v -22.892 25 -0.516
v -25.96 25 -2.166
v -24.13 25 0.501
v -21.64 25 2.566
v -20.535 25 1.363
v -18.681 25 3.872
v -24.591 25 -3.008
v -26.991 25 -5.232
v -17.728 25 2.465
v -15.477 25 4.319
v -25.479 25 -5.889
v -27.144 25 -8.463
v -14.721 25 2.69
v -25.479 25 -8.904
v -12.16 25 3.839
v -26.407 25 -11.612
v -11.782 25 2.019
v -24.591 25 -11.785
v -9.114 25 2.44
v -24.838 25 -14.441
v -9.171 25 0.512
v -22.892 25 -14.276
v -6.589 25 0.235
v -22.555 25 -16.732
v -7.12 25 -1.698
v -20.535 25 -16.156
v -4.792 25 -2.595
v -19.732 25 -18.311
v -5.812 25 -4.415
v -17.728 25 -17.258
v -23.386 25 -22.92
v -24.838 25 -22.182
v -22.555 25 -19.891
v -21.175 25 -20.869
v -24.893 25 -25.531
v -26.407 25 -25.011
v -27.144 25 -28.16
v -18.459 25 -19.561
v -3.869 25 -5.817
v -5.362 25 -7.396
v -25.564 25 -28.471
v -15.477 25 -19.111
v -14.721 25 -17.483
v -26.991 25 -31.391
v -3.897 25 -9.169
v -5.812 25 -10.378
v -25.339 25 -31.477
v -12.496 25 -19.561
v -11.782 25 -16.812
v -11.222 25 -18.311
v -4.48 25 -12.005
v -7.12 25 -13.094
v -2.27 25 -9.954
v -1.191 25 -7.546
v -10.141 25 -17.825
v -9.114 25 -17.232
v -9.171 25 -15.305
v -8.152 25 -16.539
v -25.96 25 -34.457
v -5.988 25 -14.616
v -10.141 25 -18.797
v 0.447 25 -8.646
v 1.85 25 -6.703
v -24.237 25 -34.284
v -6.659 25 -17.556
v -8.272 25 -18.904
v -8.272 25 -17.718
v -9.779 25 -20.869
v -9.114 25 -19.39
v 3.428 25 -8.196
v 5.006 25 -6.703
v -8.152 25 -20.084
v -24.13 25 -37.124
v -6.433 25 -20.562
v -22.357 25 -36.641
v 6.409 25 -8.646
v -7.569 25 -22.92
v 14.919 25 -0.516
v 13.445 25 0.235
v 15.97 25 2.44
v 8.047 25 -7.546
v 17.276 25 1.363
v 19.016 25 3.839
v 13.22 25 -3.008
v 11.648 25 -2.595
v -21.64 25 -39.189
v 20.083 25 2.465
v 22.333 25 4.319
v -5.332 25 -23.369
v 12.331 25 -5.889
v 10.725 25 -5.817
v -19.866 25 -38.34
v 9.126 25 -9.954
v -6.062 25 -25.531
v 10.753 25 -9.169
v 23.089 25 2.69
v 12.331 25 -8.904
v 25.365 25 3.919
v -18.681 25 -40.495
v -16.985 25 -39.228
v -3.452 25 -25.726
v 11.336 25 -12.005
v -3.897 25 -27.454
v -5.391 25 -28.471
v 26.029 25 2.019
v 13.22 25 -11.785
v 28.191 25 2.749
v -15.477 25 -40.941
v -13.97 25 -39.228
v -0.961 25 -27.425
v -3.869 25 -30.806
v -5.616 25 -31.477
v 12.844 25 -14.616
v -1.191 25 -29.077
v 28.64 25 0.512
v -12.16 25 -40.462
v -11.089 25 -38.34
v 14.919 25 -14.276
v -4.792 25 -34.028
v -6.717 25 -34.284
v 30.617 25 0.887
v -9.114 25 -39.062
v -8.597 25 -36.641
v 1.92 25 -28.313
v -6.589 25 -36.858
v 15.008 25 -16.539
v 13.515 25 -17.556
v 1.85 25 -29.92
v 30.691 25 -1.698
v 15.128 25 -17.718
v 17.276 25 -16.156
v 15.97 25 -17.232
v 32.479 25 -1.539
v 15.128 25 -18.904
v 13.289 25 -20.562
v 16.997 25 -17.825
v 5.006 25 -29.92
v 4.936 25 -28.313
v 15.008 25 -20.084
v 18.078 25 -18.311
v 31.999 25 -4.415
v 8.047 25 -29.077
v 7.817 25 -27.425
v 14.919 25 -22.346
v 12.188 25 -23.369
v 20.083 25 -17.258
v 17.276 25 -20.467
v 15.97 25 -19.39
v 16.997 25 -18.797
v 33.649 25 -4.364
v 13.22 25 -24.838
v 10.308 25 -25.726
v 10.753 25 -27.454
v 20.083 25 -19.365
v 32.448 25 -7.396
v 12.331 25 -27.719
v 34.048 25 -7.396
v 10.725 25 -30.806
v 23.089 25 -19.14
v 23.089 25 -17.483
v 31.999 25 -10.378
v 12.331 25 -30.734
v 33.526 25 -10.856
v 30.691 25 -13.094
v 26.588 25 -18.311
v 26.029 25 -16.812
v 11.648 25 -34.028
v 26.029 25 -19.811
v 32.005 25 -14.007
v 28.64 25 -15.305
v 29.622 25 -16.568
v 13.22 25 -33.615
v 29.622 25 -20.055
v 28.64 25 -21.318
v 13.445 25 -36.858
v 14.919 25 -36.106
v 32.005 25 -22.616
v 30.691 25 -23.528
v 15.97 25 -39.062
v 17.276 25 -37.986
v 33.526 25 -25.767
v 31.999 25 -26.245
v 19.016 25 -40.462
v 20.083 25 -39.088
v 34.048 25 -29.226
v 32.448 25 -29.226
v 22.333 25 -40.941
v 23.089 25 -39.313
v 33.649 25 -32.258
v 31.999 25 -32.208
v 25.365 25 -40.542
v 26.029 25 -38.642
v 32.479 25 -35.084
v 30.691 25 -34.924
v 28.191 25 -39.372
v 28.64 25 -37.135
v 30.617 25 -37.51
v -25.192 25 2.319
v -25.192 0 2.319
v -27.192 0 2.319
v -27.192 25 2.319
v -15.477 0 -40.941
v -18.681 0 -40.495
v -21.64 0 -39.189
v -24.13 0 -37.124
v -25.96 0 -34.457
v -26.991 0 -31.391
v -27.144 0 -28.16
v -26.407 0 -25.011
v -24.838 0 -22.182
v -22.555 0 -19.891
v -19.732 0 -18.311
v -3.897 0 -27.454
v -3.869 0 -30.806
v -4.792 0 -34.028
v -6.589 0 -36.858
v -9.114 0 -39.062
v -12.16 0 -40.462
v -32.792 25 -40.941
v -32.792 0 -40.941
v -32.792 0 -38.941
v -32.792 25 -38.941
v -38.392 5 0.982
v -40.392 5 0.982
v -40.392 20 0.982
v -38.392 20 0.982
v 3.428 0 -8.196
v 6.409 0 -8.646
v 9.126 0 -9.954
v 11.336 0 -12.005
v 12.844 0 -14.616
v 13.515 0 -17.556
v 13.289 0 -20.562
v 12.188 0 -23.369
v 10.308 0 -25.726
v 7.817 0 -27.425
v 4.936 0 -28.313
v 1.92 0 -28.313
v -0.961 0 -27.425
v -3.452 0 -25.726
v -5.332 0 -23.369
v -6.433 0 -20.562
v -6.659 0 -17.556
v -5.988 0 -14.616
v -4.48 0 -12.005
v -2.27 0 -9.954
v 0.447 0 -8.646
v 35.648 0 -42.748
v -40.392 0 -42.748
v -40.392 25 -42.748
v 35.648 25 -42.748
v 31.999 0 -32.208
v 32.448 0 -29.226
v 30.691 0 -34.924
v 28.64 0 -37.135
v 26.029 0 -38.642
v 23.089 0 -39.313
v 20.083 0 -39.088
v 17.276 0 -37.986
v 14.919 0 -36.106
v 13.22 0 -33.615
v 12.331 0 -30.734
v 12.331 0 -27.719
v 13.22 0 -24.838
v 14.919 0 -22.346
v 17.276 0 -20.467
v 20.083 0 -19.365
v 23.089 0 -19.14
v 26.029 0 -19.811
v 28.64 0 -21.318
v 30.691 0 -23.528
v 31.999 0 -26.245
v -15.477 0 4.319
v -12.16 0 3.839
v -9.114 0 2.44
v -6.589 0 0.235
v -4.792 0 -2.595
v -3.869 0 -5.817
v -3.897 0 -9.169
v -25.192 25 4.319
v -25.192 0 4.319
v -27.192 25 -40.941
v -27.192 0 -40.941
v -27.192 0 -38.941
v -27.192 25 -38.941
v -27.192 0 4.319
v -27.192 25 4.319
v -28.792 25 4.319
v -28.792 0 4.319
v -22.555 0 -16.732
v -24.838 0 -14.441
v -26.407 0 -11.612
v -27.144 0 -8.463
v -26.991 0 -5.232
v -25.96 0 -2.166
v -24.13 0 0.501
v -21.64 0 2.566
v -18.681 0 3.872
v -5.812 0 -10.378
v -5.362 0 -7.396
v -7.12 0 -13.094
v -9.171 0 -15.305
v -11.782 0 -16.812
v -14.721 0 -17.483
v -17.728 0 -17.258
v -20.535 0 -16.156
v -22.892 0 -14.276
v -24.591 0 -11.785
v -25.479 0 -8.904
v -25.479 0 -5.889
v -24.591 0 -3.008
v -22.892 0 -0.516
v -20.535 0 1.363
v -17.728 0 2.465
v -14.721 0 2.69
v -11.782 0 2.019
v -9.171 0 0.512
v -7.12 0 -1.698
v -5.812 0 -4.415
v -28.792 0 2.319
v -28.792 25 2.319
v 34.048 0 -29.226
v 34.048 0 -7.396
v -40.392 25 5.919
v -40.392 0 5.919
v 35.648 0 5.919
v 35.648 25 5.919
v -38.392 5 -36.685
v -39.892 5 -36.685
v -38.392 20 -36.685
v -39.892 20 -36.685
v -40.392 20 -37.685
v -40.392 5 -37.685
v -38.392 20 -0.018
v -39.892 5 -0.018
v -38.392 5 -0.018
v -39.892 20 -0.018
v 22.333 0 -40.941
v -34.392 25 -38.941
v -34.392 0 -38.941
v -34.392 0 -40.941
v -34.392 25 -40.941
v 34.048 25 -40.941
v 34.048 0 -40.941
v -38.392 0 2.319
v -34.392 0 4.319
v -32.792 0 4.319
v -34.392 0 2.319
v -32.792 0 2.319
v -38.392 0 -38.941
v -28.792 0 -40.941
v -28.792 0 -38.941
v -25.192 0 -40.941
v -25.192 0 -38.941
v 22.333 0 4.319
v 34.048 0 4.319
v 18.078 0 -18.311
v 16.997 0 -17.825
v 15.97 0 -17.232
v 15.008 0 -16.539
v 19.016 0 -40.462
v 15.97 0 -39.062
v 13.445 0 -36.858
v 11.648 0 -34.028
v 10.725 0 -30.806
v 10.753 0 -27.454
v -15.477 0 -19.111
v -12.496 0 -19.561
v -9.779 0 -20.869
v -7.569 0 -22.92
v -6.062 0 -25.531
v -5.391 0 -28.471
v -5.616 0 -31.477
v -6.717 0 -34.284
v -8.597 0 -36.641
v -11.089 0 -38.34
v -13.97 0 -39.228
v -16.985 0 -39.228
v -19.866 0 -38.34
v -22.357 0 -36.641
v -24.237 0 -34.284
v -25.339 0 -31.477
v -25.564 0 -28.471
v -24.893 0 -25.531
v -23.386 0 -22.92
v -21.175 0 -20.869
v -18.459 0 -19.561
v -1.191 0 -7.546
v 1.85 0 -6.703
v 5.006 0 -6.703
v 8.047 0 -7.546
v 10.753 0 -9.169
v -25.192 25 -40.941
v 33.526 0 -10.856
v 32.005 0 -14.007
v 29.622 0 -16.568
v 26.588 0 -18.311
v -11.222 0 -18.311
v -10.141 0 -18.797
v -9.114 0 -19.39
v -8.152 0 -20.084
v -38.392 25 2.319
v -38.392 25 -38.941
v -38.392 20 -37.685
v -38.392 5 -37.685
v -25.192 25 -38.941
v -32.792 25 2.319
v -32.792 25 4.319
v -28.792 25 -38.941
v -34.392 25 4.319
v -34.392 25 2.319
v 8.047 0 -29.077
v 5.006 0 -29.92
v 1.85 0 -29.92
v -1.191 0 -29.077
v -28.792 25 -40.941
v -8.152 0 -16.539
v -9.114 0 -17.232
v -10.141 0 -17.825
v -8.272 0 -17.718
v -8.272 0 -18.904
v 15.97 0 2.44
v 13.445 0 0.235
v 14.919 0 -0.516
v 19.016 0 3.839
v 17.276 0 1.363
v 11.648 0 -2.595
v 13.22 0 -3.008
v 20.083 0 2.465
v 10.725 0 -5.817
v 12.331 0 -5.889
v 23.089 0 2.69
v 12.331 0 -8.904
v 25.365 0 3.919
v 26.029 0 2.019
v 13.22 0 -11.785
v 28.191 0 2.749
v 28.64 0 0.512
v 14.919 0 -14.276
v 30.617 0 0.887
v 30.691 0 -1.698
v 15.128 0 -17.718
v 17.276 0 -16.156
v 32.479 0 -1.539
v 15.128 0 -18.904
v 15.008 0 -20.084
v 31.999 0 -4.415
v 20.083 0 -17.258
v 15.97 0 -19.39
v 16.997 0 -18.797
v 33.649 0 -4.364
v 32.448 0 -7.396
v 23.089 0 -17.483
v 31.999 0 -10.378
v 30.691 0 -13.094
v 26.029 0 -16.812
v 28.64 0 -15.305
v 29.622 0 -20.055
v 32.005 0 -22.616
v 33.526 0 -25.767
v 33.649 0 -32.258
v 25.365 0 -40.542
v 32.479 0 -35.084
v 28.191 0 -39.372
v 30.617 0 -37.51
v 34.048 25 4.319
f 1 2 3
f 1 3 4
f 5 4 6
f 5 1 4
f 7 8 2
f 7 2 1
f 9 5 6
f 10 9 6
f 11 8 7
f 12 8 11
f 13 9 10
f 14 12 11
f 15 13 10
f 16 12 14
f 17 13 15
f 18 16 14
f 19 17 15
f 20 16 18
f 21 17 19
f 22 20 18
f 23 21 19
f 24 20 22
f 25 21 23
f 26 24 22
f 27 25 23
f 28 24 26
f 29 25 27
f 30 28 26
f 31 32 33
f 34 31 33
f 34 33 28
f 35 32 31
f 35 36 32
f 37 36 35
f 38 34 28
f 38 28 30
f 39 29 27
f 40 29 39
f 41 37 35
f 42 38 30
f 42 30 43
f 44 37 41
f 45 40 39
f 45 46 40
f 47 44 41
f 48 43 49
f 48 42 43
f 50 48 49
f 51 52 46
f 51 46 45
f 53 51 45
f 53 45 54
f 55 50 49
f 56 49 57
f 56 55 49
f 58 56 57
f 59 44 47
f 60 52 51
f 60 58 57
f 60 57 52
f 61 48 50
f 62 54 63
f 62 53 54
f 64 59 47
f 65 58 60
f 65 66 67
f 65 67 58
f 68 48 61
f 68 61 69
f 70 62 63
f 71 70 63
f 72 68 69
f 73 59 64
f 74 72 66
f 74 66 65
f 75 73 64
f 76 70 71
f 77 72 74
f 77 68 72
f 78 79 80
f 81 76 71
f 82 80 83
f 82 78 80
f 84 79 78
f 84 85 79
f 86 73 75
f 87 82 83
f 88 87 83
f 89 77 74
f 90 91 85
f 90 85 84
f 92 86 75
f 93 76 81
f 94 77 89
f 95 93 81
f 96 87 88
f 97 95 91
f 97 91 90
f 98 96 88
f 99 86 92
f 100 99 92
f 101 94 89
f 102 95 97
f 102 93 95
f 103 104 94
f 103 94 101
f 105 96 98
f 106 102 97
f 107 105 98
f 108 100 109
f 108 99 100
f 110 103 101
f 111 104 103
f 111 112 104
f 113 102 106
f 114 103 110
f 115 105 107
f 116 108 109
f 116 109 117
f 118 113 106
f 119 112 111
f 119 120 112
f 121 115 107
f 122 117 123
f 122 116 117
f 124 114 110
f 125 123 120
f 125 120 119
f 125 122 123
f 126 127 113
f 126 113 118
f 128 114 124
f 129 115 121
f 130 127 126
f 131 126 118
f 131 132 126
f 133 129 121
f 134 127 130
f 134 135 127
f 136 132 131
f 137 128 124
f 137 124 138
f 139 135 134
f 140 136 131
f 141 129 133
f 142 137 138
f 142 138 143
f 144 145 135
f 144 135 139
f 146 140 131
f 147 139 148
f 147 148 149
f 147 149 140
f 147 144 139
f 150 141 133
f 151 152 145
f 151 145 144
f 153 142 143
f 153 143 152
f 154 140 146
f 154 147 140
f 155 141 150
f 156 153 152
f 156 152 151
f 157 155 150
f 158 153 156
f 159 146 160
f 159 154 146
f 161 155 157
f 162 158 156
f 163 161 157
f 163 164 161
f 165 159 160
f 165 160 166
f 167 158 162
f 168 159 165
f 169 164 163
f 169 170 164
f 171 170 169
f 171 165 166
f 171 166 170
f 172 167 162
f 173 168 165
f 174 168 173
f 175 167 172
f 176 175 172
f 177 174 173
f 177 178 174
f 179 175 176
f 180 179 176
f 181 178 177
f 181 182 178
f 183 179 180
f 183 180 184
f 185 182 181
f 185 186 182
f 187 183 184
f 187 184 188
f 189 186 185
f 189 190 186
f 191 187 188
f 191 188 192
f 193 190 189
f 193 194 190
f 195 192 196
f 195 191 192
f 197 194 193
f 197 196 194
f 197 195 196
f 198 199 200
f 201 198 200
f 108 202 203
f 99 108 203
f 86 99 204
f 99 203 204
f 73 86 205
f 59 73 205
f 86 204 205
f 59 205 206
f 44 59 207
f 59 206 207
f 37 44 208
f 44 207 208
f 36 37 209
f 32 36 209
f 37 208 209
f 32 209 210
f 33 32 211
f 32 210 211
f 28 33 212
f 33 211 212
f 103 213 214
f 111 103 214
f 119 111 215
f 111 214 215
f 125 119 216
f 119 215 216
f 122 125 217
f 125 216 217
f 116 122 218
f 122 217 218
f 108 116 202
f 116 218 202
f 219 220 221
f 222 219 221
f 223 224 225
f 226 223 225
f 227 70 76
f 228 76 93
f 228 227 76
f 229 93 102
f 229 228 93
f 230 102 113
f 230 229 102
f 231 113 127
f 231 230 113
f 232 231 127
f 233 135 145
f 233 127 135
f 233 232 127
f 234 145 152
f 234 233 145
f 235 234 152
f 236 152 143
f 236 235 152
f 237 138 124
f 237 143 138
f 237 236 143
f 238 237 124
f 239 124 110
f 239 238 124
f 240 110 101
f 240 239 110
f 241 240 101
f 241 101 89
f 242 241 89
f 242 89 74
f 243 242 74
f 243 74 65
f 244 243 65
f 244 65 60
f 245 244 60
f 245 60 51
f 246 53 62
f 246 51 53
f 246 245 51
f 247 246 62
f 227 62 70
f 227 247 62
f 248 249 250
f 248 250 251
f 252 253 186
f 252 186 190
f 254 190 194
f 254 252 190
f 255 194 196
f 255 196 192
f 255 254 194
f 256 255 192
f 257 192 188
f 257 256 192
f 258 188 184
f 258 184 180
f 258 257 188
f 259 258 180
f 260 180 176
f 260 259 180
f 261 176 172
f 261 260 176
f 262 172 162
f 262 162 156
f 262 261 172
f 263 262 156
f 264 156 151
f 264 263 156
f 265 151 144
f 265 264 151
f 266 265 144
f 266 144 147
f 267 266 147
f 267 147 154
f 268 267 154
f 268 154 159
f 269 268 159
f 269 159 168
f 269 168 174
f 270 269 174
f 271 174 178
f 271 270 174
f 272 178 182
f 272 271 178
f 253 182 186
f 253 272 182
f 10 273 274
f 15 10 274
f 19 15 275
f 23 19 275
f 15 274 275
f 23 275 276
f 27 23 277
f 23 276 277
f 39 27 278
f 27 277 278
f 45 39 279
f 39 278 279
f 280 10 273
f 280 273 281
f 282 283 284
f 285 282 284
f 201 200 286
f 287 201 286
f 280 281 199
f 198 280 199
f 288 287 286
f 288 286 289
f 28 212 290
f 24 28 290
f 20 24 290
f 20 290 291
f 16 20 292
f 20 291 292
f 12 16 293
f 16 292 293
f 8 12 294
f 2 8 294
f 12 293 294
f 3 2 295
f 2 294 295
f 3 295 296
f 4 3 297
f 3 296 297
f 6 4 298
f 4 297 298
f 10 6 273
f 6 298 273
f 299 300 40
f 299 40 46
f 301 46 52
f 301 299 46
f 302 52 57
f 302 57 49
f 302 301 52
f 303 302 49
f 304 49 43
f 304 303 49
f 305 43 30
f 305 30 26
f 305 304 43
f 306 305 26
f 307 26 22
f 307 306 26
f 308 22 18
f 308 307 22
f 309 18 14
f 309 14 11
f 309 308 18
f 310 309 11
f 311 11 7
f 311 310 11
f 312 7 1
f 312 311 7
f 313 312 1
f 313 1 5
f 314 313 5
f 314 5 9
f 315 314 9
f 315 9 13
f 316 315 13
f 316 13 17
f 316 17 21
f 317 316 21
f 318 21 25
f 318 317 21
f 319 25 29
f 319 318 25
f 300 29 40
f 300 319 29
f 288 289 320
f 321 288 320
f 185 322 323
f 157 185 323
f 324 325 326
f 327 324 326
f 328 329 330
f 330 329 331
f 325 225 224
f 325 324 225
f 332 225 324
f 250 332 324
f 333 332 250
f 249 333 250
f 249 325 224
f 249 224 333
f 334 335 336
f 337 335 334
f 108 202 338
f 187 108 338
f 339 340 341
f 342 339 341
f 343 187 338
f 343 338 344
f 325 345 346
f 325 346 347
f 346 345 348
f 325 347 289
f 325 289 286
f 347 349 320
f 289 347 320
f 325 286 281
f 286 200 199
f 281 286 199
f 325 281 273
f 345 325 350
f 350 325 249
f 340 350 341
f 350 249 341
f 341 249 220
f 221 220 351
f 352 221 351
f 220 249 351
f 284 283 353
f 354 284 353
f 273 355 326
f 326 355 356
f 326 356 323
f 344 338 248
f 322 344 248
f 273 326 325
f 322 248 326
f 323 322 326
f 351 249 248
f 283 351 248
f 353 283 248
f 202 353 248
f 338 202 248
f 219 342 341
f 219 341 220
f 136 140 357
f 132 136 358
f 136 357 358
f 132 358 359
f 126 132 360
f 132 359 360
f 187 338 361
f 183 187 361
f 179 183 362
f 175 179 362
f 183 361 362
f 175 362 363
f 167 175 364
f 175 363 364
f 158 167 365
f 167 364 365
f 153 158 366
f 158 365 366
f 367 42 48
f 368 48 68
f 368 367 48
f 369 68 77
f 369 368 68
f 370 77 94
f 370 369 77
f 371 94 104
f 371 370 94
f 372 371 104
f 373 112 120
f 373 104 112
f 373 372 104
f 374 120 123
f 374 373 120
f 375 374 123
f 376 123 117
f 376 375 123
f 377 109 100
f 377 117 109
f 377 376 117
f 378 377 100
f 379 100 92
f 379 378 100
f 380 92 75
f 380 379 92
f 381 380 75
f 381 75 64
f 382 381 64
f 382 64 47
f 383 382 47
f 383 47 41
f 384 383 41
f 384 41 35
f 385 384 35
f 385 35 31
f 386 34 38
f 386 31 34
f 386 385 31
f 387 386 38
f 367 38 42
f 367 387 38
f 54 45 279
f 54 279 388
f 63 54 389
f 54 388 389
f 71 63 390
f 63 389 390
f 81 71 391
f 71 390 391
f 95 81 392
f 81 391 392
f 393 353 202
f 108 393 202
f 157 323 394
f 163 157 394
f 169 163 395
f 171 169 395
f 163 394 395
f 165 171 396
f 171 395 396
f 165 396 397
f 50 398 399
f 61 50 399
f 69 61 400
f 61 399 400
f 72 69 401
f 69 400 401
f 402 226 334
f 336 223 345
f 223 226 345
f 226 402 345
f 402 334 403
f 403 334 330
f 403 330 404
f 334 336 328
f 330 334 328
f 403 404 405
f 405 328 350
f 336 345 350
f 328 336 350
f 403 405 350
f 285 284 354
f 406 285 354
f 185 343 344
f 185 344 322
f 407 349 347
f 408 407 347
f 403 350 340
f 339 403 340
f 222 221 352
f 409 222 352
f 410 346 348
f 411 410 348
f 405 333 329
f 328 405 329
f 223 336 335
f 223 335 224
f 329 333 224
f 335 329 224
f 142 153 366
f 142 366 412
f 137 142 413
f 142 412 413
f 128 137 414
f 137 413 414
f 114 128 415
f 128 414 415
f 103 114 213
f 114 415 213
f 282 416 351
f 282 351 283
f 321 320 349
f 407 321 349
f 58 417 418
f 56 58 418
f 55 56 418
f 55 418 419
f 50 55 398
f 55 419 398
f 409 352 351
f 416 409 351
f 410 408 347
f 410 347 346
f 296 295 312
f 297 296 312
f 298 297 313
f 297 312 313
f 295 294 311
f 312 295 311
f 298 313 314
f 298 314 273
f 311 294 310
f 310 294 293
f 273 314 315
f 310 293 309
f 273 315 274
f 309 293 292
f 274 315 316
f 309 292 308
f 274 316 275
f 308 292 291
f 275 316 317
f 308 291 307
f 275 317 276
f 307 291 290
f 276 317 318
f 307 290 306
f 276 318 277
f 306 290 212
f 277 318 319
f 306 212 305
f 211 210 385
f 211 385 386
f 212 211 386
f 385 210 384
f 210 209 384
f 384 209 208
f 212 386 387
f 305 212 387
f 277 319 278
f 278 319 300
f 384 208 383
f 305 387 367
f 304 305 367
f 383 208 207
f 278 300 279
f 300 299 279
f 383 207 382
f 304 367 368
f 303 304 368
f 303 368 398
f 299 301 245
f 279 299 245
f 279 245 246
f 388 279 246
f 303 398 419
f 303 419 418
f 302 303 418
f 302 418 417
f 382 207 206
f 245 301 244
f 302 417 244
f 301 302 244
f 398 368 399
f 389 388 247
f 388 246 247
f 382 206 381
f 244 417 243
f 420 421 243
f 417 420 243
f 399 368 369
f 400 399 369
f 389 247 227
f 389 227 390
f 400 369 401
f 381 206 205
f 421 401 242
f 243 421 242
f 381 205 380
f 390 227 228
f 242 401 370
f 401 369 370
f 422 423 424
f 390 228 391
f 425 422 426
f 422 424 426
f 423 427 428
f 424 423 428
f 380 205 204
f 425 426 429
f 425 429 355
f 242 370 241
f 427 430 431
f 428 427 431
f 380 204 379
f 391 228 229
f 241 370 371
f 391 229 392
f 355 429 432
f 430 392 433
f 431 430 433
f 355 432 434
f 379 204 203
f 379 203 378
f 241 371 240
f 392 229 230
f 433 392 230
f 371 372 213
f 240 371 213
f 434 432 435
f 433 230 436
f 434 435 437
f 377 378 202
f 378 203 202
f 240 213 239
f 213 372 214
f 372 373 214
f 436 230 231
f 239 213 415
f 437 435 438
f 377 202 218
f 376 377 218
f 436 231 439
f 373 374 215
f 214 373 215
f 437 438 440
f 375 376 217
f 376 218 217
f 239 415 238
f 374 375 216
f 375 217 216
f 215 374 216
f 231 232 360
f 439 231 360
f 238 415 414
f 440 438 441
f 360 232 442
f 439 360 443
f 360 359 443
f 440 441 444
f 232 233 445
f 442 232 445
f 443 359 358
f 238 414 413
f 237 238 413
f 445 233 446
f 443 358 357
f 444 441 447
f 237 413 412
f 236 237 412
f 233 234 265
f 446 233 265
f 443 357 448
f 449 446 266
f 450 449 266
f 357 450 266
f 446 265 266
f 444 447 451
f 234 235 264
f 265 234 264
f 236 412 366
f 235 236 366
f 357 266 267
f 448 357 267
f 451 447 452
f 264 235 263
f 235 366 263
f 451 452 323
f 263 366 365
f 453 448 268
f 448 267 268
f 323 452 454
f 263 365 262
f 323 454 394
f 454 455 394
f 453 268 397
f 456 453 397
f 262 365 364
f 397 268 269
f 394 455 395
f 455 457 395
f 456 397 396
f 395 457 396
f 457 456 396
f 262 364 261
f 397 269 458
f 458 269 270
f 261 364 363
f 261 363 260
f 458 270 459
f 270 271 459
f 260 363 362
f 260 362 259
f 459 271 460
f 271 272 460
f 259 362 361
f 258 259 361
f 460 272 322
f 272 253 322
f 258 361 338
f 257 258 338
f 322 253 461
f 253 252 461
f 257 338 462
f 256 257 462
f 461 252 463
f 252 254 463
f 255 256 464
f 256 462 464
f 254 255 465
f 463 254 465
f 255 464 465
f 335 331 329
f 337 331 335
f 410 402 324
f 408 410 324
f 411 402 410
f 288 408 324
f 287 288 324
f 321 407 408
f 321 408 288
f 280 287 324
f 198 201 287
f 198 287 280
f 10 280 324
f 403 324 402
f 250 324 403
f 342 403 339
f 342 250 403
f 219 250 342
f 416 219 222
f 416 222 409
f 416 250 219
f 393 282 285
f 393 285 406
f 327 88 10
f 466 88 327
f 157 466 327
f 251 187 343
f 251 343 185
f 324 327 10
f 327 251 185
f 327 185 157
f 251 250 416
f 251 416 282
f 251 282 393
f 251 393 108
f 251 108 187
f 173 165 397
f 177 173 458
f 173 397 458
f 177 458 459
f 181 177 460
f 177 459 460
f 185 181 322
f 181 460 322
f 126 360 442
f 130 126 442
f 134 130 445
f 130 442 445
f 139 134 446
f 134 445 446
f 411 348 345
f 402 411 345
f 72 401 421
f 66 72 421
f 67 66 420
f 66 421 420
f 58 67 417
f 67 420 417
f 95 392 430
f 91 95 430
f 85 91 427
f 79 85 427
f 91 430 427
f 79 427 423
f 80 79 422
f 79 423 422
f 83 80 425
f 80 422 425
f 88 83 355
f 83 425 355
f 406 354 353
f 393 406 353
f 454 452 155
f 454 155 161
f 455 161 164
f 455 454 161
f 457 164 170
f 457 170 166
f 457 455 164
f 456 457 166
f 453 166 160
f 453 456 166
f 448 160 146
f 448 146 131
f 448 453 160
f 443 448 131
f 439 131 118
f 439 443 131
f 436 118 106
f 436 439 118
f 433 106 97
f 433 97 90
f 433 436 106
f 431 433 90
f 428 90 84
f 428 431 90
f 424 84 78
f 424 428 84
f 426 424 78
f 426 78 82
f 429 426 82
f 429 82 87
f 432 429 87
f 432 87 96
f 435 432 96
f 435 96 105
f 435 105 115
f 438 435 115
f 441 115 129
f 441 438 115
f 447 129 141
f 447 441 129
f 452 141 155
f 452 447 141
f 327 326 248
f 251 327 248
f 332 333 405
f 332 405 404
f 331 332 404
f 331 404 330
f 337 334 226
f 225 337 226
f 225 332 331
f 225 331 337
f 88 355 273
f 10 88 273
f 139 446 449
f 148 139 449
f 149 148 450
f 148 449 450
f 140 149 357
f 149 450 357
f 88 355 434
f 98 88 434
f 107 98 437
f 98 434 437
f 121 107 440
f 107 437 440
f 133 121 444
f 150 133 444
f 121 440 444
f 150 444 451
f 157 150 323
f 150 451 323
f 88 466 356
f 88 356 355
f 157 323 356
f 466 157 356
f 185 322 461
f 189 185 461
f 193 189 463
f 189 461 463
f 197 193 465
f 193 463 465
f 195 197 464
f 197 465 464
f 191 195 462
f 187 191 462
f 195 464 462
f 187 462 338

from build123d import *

# Parameters (mm, degrees)
SKETCH1_R             = 10.115000047
BOSS_EXTRUDE4_DEPTH   = 25
SKETCH1_W             = 76.040669035
SKETCH1_H             = 48.666950676
BOSS_EXTRUDE4_2_DEPTH = 25
SKETCH1_9_R           = 10.115000047
CUT_EXTRUDE1_DEPTH    = 36
SKETCH4_W             = 1
SKETCH4_H             = 15
CUT_EXTRUDE3_DEPTH    = 3
SKETCH5_W             = 38.666950676
SKETCH5_H             = 15
CUT_EXTRUDE4_DEPTH    = 0.5


with BuildPart() as part:
    # Sketch1 → Boss-Extrude4 (new body)
    with BuildSketch(Plane(origin=(0, 0, 0), x_dir=(1, 0, 0), z_dir=(0, 1, 0))):
        with BuildLine():
            ThreePointArc((22.33335059, 40.941406253), (13.444930876, 36.857737704), (10.753243591, 27.45373997))
            ThreePointArc((10.753243591, 27.45373997), (3.42801602, 30.026406253), (-3.897211552, 27.45373997))
            ThreePointArc((-3.897211552, 27.45373997), (-6.588898838, 36.857737705), (-15.477318554, 40.941406253))
            ThreePointArc((-15.477318554, 40.941406253), (-26.990581515, 31.391123299), (-19.732197967, 18.3114063))
            ThreePointArc((-19.732197967, 18.3114063), (-26.990581514, 5.231689296), (-15.477318545, -4.318593653))
            ThreePointArc((-15.477318545, -4.318593653), (-6.588898835, -0.234925102), (-3.897211552, 9.16907263))
            ThreePointArc((-3.897211552, 9.16907263), (3.42801602, 6.596406347), (10.753243591, 9.16907263))
            ThreePointArc((10.753243591, 9.16907263), (13.444930875, -0.234925102), (22.333350586, -4.318593653))
            ThreePointArc((22.333350586, -4.318593653), (30.617106493, -0.887349608), (34.048350537, 7.3964063))
            ThreePointArc((34.048350537, 7.3964063), (32.005142976, 14.006826546), (26.588230006, 18.3114063))
            ThreePointArc((26.588230006, 18.3114063), (32.005142976, 22.615986054), (34.048350537, 29.2264063))
            ThreePointArc((34.048350537, 29.2264063), (30.617106494, 37.510162206), (22.33335059, 40.941406253))
        make_face()
        with Locations((22.333350584, 29.2264063)):
            Circle(SKETCH1_R, mode=Mode.SUBTRACT)
        with BuildLine():
            ThreePointArc((15.008123013, 20.08407263), (16.475850608, 19.080918735), (18.078471162, 18.3114063))
            ThreePointArc((18.078471162, 18.3114063), (16.475850608, 17.541893865), (15.008123013, 16.53873997))
            ThreePointArc((15.008123013, 16.53873997), (15.143015973, 18.3114063), (15.008123013, 20.08407263))
        make_face(mode=Mode.SUBTRACT)
        with Locations((22.333350584, 7.3964063)):
            Circle(SKETCH1_R, mode=Mode.SUBTRACT)
        with BuildLine():
            ThreePointArc((-8.152090974, 16.53873997), (-9.619818569, 17.541893865), (-11.222439123, 18.3114063))
            ThreePointArc((-11.222439123, 18.3114063), (-9.619818569, 19.080918735), (-8.152090974, 20.08407263))
            ThreePointArc((-8.152090974, 20.08407263), (-8.286983933, 18.3114063), (-8.152090974, 16.53873997))
        make_face(mode=Mode.SUBTRACT)
        with Locations((-15.477318545, 7.3964063)):
            Circle(SKETCH1_R, mode=Mode.SUBTRACT)
    extrude(amount=BOSS_EXTRUDE4_DEPTH)

    # Sketch1<9> → Cut-Extrude1 (cut)
    with BuildSketch(Plane(origin=(0, 0, 0), x_dir=(1, 0, 0), z_dir=(0, 1, 0))):
        with Locations((3.42801602, 18.3114063)):
            Circle(SKETCH1_9_R)
        with Locations((-15.477318545, 29.2264063)):
            Circle(SKETCH1_9_R)
    extrude(amount=CUT_EXTRUDE1_DEPTH, mode=Mode.SUBTRACT)


with BuildPart() as body_2:
    # Sketch1 → Boss-Extrude4 2 (new body)
    with BuildSketch(Plane(origin=(0, 0, 0), x_dir=(1, 0, 0), z_dir=(0, 1, 0))):
        with Locations((-2.371983981, 18.414881685)):
            Rectangle(SKETCH1_W, SKETCH1_H)
        Polygon((-25.192318498, 38.941406253), (-25.192318498, 40.941406253), (-15.477318554, 40.941406253), (22.33335059, 40.941406253), (34.048350537, 40.941406253), (34.048350537, 29.2264063), (34.048350537, 7.3964063), (34.048350537, -4.318593653), (22.333350586, -4.318593653), (-15.477318545, -4.318593653), (-25.192318498, -4.318593653), (-25.192318498, -2.318593653), (-27.192318498, -2.318593653), (-27.192318498, -4.318593653), (-28.792318498, -4.318593653), (-28.792318498, -2.318593653), (-32.792318498, -2.318593653), (-32.792318498, -4.318593653), (-34.392318498, -4.318593653), (-34.392318498, -2.318593653), (-38.392318498, -2.318593653), (-38.392318498, 38.941406253), (-34.392318498, 38.941406253), (-34.392318498, 40.941406253), (-32.792318498, 40.941406253), (-32.792318498, 38.941406253), (-28.792318498, 38.941406253), (-28.792318498, 40.941406253), (-27.192318498, 40.941406253), (-27.192318498, 38.941406253), align=None, mode=Mode.SUBTRACT)
    extrude(amount=BOSS_EXTRUDE4_2_DEPTH)

    # Sketch4 → Cut-Extrude3 (cut)
    with BuildSketch(Plane.ZY.offset(40.392318498)):
        with Locations((0.482034275, 12.5)):
            Rectangle(SKETCH4_W, SKETCH4_H)
        with Locations((-37.184916401, 12.5)):
            Rectangle(SKETCH4_W, SKETCH4_H)
    extrude(amount=-CUT_EXTRUDE3_DEPTH, mode=Mode.SUBTRACT)

    # Sketch5 → Cut-Extrude4 (cut)
    with BuildSketch(Plane.ZY.offset(40.392318498)):
        with Locations((-18.351441063, 12.5)):
            Rectangle(SKETCH5_W, SKETCH5_H)
    extrude(amount=-CUT_EXTRUDE4_DEPTH, mode=Mode.SUBTRACT)


solid = Compound([part.part, body_2.part])
